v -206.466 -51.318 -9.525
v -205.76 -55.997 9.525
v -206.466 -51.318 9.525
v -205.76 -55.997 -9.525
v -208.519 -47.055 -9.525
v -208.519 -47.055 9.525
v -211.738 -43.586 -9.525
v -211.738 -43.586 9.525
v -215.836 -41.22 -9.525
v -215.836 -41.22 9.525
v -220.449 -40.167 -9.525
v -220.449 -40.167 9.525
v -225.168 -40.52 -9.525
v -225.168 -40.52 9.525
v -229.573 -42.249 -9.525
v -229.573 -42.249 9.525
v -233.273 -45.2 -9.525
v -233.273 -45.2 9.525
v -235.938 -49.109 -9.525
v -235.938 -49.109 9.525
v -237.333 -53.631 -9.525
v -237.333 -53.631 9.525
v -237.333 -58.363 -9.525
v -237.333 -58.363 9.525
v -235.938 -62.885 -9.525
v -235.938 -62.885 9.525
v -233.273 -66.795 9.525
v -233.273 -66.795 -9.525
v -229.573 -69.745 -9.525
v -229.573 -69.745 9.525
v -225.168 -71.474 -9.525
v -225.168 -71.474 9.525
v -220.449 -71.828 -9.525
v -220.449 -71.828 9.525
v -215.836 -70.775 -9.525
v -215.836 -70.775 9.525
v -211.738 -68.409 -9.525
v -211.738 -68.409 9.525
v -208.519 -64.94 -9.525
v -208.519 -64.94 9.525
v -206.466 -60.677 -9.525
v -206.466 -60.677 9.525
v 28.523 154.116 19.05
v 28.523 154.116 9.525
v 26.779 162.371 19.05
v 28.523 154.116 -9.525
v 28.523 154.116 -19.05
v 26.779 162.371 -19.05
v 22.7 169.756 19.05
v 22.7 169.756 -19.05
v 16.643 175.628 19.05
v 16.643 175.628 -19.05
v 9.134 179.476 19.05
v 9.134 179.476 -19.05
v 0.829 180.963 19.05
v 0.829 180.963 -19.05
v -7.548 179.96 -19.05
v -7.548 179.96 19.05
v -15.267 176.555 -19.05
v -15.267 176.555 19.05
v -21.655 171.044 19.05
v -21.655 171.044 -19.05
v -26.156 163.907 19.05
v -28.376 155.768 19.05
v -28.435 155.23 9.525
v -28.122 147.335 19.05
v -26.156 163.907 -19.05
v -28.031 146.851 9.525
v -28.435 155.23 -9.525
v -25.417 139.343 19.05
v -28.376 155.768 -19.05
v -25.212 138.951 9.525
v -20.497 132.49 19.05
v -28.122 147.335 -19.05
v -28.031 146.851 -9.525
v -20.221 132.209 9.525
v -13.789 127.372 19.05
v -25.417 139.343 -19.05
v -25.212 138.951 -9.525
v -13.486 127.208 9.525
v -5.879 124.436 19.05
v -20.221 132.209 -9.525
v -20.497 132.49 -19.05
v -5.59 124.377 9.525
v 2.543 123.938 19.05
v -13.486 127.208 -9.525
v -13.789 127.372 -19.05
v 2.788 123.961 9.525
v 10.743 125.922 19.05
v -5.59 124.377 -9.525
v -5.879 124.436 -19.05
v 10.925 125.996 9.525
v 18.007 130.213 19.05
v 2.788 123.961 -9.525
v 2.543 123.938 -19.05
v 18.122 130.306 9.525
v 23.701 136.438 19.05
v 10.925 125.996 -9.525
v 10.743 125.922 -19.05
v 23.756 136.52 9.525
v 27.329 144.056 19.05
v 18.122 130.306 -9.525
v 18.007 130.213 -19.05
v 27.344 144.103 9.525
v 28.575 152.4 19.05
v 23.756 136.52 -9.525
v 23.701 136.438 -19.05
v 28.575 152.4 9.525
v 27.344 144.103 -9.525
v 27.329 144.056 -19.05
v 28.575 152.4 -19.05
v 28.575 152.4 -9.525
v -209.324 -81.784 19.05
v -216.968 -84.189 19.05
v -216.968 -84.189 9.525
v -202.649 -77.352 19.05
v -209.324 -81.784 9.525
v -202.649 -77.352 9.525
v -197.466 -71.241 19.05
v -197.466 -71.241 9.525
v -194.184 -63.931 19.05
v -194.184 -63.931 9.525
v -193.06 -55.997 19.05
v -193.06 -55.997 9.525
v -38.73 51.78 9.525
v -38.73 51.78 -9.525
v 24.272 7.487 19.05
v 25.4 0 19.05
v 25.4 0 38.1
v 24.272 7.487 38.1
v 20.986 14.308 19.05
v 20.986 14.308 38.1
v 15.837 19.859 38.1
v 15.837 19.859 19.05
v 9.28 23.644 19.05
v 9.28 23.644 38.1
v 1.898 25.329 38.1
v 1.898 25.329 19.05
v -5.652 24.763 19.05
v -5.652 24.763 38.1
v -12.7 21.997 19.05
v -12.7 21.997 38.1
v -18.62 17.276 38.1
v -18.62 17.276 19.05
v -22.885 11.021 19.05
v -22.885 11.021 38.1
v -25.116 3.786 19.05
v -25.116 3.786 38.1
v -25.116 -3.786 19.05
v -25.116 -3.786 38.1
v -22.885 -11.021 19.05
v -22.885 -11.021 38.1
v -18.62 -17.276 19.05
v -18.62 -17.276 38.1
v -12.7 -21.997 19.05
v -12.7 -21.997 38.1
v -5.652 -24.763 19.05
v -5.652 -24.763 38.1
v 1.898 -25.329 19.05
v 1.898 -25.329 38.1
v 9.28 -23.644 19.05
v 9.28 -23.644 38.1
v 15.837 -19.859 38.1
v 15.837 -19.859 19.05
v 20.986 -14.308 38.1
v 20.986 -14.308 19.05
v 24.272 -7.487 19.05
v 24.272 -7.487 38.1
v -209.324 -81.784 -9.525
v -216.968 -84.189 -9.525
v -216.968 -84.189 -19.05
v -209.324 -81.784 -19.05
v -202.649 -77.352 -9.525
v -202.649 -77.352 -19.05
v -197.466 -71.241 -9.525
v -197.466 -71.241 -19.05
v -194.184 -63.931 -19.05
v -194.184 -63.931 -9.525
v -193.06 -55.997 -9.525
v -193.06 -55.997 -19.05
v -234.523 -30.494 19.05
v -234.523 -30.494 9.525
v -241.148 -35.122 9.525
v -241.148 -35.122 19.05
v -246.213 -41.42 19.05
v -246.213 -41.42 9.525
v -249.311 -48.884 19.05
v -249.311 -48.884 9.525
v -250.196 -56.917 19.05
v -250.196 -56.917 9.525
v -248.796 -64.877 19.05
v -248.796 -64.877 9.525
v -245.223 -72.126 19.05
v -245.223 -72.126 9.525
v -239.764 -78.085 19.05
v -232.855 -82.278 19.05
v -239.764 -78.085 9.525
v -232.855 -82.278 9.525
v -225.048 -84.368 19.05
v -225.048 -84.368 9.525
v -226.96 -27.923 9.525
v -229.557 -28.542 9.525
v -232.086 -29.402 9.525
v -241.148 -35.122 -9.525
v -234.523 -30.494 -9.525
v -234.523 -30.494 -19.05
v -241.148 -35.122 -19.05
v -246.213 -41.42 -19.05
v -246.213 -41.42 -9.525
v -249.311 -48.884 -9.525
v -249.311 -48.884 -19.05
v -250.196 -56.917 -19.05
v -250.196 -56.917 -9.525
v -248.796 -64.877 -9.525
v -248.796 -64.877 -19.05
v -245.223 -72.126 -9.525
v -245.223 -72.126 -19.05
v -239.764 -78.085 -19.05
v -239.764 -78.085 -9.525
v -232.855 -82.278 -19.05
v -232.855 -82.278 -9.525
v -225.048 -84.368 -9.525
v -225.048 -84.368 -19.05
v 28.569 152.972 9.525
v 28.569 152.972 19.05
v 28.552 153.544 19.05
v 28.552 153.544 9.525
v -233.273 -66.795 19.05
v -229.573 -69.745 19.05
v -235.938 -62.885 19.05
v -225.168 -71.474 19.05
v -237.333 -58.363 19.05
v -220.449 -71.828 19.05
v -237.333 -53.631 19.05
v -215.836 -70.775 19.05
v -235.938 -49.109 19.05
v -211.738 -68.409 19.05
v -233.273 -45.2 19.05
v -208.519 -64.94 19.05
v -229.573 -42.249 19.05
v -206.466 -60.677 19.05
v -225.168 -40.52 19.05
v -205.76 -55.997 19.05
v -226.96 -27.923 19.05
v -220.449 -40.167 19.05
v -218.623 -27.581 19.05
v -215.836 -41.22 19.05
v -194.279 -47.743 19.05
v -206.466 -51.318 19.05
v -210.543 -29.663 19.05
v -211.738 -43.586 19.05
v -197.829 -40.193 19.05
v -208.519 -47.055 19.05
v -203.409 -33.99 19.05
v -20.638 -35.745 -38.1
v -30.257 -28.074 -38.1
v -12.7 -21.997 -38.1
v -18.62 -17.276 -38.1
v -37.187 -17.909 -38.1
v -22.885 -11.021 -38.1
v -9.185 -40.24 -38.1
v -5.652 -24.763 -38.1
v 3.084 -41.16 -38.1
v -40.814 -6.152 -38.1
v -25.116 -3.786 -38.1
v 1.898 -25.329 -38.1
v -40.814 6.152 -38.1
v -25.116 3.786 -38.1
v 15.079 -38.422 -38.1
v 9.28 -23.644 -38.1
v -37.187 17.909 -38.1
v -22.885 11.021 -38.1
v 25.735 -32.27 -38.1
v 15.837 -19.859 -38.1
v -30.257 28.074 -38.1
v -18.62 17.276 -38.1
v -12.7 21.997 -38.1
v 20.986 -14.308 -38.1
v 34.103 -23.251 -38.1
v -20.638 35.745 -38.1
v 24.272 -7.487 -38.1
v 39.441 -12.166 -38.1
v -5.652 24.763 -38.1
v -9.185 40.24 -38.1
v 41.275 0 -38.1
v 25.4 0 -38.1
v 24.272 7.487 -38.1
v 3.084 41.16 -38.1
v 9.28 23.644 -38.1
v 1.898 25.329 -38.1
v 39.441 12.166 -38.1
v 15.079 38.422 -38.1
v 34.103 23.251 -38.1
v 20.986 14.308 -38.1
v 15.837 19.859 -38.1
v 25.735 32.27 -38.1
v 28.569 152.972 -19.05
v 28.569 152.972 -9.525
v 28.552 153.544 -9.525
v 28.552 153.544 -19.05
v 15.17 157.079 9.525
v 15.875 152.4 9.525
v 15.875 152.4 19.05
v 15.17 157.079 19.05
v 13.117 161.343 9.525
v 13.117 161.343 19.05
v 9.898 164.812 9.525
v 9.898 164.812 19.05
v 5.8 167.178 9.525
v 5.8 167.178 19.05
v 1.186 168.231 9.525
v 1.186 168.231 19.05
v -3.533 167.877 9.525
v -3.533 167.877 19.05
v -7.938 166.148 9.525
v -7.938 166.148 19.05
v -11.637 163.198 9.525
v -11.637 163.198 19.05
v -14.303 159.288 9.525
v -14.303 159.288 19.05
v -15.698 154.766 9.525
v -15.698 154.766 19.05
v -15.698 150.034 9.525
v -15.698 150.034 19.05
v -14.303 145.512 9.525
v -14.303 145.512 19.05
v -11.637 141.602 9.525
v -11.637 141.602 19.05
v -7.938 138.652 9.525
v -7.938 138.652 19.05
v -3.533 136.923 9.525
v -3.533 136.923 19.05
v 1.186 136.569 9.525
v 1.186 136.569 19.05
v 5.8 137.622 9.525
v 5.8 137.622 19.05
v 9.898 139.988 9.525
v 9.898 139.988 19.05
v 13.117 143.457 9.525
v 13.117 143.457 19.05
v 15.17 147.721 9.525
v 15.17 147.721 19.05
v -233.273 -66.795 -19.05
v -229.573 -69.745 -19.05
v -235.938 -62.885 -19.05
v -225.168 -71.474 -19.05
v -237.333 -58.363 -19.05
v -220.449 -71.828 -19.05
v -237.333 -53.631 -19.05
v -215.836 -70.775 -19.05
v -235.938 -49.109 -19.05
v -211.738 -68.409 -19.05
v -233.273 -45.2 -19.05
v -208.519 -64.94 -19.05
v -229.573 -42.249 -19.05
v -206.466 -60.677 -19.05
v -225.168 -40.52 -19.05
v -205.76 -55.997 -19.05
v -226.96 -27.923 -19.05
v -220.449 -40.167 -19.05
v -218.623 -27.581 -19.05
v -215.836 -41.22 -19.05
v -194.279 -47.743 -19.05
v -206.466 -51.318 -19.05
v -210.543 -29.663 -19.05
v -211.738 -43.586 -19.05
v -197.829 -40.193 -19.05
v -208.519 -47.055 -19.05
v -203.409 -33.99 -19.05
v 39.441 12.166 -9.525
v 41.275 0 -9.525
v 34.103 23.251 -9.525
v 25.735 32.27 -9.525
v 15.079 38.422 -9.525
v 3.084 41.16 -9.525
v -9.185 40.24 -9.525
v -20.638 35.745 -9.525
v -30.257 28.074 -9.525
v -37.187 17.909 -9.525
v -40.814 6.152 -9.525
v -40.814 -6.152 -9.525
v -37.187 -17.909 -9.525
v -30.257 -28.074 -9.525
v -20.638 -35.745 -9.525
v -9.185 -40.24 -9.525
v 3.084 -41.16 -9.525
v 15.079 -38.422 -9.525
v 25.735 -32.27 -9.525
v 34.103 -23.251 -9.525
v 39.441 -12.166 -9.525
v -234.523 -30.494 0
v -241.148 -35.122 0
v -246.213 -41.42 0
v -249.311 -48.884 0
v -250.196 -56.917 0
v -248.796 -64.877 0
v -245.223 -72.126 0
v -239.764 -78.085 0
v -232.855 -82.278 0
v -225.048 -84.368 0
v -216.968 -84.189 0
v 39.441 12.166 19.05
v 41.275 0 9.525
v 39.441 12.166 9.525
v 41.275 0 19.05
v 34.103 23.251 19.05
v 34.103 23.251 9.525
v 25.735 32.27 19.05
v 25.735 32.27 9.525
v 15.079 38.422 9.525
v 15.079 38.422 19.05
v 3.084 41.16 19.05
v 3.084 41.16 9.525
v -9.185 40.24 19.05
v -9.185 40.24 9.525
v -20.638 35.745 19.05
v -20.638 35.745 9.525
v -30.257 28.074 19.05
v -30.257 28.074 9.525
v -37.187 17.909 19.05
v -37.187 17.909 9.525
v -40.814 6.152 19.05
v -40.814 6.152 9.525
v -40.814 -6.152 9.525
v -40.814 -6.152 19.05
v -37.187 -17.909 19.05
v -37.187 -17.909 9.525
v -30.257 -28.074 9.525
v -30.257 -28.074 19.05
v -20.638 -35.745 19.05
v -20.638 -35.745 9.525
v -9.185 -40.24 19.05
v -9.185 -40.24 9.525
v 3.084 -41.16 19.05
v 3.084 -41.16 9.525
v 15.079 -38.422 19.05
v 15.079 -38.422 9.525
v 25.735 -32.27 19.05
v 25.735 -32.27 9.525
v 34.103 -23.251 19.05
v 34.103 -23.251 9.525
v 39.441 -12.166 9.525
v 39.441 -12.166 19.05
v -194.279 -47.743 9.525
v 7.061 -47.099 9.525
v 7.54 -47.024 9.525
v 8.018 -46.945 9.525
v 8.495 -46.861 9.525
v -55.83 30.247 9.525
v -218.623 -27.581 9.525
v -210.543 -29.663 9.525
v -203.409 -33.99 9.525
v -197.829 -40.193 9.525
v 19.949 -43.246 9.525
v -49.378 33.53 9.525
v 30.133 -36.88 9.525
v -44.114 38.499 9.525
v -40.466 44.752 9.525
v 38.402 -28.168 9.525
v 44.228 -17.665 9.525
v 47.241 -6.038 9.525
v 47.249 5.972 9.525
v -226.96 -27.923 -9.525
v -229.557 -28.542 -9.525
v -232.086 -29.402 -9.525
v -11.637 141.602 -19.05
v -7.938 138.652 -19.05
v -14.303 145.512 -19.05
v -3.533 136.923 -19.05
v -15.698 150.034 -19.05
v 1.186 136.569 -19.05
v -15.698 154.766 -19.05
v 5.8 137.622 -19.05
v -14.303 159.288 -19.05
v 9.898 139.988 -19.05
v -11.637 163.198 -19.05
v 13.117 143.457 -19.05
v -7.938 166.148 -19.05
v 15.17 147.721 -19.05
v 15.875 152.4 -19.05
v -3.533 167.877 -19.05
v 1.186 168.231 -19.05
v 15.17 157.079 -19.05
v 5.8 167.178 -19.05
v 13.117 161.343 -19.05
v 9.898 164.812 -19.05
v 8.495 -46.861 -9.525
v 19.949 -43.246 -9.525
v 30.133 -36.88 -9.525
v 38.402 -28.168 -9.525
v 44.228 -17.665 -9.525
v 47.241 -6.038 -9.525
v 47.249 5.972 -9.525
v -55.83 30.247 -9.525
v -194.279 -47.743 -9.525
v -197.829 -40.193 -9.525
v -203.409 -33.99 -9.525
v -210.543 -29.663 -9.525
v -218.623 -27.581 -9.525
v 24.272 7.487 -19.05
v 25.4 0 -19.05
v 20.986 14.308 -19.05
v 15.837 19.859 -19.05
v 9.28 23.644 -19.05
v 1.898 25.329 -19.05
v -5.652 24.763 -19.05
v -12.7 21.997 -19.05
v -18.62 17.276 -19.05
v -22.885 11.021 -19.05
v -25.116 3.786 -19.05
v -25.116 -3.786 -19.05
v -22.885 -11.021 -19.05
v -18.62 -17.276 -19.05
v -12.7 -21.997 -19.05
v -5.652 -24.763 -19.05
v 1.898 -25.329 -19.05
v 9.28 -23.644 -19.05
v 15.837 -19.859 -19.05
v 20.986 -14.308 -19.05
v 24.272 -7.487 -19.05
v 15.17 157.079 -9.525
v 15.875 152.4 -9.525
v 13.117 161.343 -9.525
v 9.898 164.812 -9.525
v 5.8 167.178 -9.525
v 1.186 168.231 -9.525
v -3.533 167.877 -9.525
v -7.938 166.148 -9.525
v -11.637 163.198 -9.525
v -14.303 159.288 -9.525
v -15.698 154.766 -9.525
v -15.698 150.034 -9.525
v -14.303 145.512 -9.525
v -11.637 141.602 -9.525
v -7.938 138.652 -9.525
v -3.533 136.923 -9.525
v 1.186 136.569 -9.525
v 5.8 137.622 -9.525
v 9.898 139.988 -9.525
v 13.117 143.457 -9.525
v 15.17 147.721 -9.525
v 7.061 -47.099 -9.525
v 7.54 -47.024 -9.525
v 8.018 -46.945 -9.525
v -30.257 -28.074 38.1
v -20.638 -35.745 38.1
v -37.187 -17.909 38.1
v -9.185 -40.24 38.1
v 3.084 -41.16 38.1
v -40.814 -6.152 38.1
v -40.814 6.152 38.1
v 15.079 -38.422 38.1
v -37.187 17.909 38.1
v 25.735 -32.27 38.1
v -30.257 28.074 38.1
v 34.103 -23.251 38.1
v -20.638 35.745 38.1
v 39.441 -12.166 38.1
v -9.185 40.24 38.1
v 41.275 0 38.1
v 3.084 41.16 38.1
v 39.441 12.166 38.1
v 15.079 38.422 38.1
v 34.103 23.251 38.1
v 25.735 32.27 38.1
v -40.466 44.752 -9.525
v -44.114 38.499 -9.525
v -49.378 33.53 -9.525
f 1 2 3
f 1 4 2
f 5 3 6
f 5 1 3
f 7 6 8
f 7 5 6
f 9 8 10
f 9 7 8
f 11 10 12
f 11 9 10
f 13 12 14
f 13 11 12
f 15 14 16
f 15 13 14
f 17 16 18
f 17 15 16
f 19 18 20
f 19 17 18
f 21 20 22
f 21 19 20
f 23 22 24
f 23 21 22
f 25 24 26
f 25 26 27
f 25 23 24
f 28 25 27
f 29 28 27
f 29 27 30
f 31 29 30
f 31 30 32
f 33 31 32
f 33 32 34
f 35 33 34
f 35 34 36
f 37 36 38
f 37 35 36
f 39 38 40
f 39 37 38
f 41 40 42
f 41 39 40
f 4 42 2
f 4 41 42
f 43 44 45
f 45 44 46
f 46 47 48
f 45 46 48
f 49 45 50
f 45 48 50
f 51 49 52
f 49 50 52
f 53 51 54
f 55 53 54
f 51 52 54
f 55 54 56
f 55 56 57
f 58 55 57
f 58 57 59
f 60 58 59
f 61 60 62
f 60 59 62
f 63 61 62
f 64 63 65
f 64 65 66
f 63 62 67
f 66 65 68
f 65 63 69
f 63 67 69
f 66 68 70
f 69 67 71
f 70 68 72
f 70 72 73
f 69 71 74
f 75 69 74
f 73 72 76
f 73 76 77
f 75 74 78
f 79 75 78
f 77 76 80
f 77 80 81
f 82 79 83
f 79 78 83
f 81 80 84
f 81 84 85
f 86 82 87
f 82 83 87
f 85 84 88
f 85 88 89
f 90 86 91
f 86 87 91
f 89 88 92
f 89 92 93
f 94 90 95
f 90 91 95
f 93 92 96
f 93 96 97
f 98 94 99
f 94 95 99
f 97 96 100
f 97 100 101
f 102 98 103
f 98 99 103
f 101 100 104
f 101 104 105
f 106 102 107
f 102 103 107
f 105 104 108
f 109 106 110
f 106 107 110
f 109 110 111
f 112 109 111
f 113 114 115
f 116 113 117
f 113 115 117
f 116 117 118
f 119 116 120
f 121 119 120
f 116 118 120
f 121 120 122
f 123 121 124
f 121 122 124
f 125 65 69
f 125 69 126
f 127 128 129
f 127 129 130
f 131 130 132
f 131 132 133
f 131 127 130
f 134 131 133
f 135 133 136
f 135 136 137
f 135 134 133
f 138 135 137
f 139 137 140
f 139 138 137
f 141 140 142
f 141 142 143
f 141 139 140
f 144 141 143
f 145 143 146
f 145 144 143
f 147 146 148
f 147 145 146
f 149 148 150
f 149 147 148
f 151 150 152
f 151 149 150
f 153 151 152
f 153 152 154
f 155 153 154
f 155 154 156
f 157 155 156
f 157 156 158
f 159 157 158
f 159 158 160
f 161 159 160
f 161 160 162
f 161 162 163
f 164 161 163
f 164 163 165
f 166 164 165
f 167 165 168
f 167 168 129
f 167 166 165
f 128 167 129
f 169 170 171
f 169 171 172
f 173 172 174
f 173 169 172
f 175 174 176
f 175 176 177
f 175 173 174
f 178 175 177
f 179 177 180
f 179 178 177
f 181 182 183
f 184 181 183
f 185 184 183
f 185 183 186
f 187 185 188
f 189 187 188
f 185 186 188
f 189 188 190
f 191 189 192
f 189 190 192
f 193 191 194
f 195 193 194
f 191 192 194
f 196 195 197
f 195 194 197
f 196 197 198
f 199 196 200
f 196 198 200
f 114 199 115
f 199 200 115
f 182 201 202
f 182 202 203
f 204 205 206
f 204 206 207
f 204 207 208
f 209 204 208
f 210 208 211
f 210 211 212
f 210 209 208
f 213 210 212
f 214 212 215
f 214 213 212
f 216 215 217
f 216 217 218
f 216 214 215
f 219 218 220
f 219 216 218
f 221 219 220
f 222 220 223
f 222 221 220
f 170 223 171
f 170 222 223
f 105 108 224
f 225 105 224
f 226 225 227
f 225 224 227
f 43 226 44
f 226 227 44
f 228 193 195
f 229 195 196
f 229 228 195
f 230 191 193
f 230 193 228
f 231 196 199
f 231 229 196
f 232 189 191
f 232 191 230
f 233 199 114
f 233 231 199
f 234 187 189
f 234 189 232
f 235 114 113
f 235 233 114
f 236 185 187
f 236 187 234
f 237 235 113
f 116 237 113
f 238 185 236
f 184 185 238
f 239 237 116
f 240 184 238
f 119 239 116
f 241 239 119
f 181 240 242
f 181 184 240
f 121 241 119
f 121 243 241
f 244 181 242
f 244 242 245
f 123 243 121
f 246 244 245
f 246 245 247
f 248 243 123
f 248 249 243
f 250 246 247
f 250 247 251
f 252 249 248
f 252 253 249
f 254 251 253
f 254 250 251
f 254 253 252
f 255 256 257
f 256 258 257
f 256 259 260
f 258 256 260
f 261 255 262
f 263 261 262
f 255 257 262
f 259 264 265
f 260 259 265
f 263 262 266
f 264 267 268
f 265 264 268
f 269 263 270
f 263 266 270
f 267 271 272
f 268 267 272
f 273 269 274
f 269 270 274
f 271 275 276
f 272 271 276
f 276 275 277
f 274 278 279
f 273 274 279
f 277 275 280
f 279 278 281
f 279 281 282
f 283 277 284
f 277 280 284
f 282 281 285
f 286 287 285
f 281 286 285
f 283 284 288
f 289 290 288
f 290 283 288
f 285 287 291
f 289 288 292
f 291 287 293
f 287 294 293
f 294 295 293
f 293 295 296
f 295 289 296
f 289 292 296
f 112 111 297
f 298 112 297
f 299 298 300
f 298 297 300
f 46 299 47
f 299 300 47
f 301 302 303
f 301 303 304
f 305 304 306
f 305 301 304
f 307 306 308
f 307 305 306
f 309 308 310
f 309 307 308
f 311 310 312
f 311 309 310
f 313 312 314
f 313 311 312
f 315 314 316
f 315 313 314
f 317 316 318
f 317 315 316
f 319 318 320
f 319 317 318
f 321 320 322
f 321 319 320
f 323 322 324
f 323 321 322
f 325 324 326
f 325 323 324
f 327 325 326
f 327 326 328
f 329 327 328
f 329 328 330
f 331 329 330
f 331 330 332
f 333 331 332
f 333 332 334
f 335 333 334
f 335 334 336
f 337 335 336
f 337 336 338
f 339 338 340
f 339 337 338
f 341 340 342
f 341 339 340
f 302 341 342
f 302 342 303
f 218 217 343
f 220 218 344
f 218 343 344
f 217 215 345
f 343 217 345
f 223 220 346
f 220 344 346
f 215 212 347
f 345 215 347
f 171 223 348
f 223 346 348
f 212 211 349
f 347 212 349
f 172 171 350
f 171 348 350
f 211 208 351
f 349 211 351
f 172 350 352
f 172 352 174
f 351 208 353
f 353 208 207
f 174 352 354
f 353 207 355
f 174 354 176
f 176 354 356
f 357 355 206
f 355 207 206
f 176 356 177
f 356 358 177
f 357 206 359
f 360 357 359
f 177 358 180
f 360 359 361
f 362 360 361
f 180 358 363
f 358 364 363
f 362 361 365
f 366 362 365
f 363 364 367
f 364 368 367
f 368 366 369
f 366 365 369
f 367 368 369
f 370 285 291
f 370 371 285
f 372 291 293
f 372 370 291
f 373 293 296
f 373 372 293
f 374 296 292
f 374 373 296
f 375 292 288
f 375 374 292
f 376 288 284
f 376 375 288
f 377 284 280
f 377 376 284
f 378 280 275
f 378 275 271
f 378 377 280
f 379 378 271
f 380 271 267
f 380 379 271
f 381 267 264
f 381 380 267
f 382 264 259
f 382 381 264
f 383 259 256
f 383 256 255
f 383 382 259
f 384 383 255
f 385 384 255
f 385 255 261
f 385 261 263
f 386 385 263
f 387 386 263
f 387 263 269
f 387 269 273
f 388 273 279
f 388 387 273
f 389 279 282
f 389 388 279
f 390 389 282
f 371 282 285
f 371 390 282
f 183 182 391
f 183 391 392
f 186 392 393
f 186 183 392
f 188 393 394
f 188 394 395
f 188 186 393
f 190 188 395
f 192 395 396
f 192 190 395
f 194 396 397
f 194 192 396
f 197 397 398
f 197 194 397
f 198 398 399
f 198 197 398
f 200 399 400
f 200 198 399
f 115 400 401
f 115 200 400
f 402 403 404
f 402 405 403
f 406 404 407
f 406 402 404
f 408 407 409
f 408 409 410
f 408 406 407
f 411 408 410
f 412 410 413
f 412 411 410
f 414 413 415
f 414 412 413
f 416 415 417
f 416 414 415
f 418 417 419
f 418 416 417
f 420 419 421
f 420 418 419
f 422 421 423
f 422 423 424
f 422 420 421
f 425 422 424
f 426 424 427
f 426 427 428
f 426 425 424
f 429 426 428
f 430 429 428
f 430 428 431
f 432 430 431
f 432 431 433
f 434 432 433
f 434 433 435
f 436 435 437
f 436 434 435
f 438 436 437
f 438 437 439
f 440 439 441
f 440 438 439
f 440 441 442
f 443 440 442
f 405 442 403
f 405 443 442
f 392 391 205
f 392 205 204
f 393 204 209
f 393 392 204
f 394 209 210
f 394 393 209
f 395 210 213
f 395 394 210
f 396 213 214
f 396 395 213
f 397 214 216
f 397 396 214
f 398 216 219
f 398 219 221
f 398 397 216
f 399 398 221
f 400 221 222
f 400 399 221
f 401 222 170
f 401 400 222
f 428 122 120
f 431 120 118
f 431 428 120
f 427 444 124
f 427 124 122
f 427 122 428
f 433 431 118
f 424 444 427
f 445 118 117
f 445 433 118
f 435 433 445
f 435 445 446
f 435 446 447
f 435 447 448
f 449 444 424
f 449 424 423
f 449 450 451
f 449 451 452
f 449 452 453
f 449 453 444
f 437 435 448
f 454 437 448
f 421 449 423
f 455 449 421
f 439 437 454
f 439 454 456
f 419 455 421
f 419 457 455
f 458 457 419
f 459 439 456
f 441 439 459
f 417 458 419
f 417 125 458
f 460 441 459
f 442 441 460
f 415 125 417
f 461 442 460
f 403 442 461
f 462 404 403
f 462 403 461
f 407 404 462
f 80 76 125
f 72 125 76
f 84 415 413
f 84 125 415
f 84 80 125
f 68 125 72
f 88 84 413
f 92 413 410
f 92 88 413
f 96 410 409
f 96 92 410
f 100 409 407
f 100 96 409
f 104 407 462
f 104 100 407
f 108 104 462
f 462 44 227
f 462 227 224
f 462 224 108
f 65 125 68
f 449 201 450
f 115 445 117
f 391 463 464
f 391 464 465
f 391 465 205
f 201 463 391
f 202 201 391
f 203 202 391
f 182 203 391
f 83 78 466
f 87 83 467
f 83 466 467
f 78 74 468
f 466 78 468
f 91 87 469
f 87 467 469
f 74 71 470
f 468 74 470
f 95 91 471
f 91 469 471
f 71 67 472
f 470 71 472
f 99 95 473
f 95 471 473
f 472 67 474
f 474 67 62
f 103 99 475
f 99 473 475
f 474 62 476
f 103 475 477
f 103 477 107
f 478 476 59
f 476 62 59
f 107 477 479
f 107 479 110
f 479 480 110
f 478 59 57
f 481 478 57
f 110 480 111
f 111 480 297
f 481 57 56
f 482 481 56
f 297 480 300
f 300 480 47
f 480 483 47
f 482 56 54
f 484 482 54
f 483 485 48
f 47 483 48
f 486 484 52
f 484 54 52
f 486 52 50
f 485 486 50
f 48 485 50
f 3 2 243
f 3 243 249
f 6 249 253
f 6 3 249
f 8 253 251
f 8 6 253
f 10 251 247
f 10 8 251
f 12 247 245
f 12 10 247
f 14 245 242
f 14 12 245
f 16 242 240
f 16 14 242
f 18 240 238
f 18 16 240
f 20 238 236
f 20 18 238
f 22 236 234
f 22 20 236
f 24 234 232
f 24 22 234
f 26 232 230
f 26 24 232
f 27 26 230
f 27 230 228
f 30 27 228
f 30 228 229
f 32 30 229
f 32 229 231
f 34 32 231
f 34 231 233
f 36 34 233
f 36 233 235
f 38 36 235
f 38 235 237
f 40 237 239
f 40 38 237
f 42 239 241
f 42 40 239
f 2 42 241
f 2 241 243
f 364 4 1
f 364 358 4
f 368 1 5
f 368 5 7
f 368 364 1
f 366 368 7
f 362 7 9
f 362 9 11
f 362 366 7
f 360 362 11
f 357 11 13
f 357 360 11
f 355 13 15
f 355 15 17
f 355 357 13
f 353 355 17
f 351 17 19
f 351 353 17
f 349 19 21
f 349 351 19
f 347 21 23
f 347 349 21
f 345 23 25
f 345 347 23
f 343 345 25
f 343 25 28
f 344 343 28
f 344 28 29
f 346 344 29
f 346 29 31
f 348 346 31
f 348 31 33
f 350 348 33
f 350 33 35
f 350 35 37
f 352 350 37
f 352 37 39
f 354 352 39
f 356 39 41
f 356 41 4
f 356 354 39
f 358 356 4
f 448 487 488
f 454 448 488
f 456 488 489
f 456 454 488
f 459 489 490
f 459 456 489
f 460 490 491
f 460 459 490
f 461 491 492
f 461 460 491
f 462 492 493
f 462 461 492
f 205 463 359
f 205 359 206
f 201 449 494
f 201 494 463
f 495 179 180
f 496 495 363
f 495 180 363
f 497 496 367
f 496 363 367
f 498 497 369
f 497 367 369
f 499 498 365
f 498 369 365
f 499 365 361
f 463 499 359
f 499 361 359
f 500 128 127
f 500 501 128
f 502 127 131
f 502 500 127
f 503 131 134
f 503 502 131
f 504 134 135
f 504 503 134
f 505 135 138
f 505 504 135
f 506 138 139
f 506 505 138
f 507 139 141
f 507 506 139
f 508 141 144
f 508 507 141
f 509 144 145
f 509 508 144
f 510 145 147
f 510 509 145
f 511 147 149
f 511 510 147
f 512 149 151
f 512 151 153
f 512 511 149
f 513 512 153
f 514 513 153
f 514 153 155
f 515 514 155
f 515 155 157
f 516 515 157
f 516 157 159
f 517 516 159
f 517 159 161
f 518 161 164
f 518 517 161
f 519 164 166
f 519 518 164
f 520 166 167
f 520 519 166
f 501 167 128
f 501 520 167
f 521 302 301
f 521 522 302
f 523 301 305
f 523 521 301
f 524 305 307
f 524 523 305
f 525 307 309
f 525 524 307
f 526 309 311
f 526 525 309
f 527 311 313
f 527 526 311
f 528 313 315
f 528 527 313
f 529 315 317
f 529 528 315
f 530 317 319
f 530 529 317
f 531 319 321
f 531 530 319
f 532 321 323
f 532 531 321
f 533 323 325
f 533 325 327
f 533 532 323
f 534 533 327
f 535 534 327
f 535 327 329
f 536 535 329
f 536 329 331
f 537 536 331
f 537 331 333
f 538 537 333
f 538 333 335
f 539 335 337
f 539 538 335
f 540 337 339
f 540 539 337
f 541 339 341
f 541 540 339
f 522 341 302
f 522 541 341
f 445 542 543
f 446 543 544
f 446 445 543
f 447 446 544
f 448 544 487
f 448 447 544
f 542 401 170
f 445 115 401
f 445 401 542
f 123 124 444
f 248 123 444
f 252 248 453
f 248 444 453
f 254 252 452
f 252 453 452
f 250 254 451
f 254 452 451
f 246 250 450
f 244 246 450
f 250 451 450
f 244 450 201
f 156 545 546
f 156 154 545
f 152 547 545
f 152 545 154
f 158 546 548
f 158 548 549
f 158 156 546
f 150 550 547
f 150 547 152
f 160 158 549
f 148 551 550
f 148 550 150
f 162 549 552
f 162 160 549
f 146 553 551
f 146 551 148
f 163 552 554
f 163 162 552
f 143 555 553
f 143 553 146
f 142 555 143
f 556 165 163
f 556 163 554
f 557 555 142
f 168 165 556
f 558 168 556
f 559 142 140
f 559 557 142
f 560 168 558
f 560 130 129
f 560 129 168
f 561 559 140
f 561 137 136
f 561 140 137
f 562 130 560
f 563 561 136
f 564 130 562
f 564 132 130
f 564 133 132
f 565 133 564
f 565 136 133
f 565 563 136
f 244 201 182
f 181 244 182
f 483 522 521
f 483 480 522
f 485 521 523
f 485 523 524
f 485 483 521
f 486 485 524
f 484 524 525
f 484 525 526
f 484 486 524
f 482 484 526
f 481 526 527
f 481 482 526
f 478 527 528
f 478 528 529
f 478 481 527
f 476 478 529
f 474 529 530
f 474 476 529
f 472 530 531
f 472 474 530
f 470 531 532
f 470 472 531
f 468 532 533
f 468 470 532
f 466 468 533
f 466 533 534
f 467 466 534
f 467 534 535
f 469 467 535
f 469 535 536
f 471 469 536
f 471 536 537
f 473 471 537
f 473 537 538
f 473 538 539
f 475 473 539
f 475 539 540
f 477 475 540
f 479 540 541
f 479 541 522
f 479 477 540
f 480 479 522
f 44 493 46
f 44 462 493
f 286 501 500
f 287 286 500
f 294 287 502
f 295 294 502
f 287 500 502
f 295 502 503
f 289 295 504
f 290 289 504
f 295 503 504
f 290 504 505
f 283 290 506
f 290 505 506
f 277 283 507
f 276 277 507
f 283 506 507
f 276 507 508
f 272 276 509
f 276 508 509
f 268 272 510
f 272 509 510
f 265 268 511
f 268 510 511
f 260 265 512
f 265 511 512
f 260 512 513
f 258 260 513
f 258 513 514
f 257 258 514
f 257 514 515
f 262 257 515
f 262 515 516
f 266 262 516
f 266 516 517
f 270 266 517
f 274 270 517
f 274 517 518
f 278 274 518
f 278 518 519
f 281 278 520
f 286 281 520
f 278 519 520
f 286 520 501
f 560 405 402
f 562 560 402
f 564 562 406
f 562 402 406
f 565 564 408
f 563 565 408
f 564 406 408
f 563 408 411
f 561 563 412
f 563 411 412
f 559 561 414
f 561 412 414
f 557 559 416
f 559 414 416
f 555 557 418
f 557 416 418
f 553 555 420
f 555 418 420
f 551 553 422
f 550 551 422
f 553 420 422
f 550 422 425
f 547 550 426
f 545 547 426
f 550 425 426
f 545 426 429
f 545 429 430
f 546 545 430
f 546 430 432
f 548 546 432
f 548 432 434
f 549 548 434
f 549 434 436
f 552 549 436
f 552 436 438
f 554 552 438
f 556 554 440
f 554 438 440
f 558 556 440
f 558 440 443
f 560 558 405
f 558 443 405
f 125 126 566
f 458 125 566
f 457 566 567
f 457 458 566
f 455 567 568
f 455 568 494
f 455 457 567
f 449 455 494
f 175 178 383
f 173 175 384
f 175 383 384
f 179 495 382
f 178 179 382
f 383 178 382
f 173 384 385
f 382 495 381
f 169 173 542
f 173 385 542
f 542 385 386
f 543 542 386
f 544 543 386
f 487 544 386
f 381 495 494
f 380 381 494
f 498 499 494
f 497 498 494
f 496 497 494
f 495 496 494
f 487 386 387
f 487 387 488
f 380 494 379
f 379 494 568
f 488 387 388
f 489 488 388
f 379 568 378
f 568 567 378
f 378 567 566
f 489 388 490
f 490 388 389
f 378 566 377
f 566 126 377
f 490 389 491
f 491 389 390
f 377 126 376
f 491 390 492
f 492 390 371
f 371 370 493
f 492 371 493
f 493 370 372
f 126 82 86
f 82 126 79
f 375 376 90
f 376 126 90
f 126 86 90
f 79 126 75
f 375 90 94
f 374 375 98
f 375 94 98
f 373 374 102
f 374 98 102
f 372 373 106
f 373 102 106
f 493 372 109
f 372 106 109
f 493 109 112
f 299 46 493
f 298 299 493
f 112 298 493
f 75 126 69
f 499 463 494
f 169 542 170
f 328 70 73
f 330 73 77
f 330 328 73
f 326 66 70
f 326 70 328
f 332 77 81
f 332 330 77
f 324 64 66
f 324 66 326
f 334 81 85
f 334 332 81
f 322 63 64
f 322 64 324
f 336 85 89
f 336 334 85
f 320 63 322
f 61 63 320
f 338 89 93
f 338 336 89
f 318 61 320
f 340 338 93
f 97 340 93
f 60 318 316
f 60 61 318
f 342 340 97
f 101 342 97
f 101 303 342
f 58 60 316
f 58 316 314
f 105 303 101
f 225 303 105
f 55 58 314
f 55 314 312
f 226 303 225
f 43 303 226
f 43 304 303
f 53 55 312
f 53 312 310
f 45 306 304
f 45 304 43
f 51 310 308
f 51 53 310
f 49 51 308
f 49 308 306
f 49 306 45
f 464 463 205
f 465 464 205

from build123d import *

# Parameters (mm, degrees)
F0_R     = 15.875
F0_R_2   = 41.275
F1_DEPTH = 9.525
F0_R_3   = 25.4
F2_DEPTH = 19.05
F3_DEPTH = 19.05
F4_DEPTH = 19.05


with BuildPart() as f1:
    # F0 (on Top) → F1 (new body, symmetric)
    with BuildSketch(Plane.XY):
        with BuildLine():
            ThreePointArc((-28.4345366302, 155.2297973728), (-1.4166406822, 123.860137475), (28.5749999751, 152.4000000228))
            ThreePointArc((28.5749999751, 152.4000000228), (28.5621057669, 153.2583343061), (28.5234347788, 154.1158939584))
            ThreePointArc((28.5234347788, 154.1158939584), (0.5587225598, 180.9695371922), (-28.4345366302, 155.2297973728))
        make_face()
        with Locations((-2.49e-08, 152.4000000228)):
            Circle(F0_R, mode=Mode.SUBTRACT)
        with BuildLine():
            ThreePointArc((28.5234347788, 154.1158939584), (28.5621057669, 153.2583343061), (28.5749999751, 152.4000000228))
            ThreePointArc((28.5749999751, 152.4000000228), (-1.4166406822, 123.860137475), (-28.4345366302, 155.2297973728))
            Line((-28.4345366302, 155.2297973728), (-38.7298241401, 51.7800823041))
            ThreePointArc((-38.7298241401, 51.7800823041), (-44.114260266, 38.4992634308), (-55.8304596742, 30.2468108398))
            Line((-55.8304596742, 30.2468108398), (-226.9598003085, -27.9227065693))
            ThreePointArc((-226.9598003085, -27.9227065693), (-203.4092582541, -33.9896178831), (-193.0604315885, -55.9972808801))
            ThreePointArc((-193.0604315885, -55.9972808801), (-199.8420995066, -74.4791991184), (-216.9681342495, -84.1885376905))
            Line((-216.9681342495, -84.1885376905), (7.0608757552, -47.0986693928))
            Line((7.0608757552, -47.0986693928), (8.4949702479, -46.8612431065))
            ThreePointArc((8.4949702479, -46.8612431065), (38.4017712026, -28.1681485637), (47.2490373051, 5.9723612369))
            Line((47.2490373051, 5.9723612369), (28.5234347788, 154.1158939584))
        make_face()
        Circle(F0_R_2, mode=Mode.SUBTRACT)
        with BuildLine():
            ThreePointArc((7.0608757552, -47.0986693928), (7.7788288983, -46.9854280173), (8.4949702479, -46.8612431065))
            Line((8.4949702479, -46.8612431065), (7.0608757552, -47.0986693928))
        make_face()
        with BuildLine():
            Line((-234.5231416734, -30.4936036204), (-226.9598003085, -27.9227065693))
            ThreePointArc((-226.9598003085, -27.9227065693), (-230.8317532179, -28.9425531326), (-234.5231416734, -30.4936036204))
        make_face()
        with BuildLine():
            ThreePointArc((-193.0604315885, -55.9972808801), (-203.4092582541, -33.9896178831), (-226.9598003085, -27.9227065693))
            Line((-226.9598003085, -27.9227065693), (-234.5231416734, -30.4936036204))
            ThreePointArc((-234.5231416734, -30.4936036204), (-248.7957018858, -64.8770524072), (-216.9681342495, -84.1885376905))
            ThreePointArc((-216.9681342495, -84.1885376905), (-199.8420995066, -74.4791991184), (-193.0604315885, -55.9972808801))
        make_face()
        with Locations((-221.6354315885, -55.9972808801)):
            Circle(F0_R, mode=Mode.SUBTRACT)
    extrude(amount=F1_DEPTH, both=True)

    # F0 (on Top) → F2 (join, symmetric)
    with BuildSketch(Plane.XY):
        with BuildLine():
            ThreePointArc((-193.0604315885, -55.9972808801), (-203.4092582541, -33.9896178831), (-226.9598003085, -27.9227065693))
            Line((-226.9598003085, -27.9227065693), (-234.5231416734, -30.4936036204))
            ThreePointArc((-234.5231416734, -30.4936036204), (-248.7957018858, -64.8770524072), (-216.9681342495, -84.1885376905))
            ThreePointArc((-216.9681342495, -84.1885376905), (-199.8420995066, -74.4791991184), (-193.0604315885, -55.9972808801))
        make_face()
        with Locations((-221.6354315885, -55.9972808801)):
            Circle(F0_R, mode=Mode.SUBTRACT)
        with BuildLine():
            ThreePointArc((-28.4345366302, 155.2297973728), (-1.4166406822, 123.860137475), (28.5749999751, 152.4000000228))
            ThreePointArc((28.5749999751, 152.4000000228), (28.5621057669, 153.2583343061), (28.5234347788, 154.1158939584))
            ThreePointArc((28.5234347788, 154.1158939584), (0.5587225598, 180.9695371922), (-28.4345366302, 155.2297973728))
        make_face()
        with Locations((-2.49e-08, 152.4000000228)):
            Circle(F0_R, mode=Mode.SUBTRACT)
        Circle(F0_R_2)
        Circle(F0_R_3, mode=Mode.SUBTRACT)
    extrude(amount=F2_DEPTH, both=True)

    # F3 (add): a face of the model
    f3_faces = [f1.faces().sort_by_distance(p)[0] for p in [
        (-40.1075667043, 0, 19.05),
    ]]
    extrude(f3_faces, amount=F3_DEPTH)

    # F4 (add): a face of the model
    f4_faces = [f1.faces().sort_by_distance(p)[0] for p in [
        (-40.1075667043, 0, -19.05),
    ]]
    extrude(f4_faces, amount=F4_DEPTH)


solid = f1.part
